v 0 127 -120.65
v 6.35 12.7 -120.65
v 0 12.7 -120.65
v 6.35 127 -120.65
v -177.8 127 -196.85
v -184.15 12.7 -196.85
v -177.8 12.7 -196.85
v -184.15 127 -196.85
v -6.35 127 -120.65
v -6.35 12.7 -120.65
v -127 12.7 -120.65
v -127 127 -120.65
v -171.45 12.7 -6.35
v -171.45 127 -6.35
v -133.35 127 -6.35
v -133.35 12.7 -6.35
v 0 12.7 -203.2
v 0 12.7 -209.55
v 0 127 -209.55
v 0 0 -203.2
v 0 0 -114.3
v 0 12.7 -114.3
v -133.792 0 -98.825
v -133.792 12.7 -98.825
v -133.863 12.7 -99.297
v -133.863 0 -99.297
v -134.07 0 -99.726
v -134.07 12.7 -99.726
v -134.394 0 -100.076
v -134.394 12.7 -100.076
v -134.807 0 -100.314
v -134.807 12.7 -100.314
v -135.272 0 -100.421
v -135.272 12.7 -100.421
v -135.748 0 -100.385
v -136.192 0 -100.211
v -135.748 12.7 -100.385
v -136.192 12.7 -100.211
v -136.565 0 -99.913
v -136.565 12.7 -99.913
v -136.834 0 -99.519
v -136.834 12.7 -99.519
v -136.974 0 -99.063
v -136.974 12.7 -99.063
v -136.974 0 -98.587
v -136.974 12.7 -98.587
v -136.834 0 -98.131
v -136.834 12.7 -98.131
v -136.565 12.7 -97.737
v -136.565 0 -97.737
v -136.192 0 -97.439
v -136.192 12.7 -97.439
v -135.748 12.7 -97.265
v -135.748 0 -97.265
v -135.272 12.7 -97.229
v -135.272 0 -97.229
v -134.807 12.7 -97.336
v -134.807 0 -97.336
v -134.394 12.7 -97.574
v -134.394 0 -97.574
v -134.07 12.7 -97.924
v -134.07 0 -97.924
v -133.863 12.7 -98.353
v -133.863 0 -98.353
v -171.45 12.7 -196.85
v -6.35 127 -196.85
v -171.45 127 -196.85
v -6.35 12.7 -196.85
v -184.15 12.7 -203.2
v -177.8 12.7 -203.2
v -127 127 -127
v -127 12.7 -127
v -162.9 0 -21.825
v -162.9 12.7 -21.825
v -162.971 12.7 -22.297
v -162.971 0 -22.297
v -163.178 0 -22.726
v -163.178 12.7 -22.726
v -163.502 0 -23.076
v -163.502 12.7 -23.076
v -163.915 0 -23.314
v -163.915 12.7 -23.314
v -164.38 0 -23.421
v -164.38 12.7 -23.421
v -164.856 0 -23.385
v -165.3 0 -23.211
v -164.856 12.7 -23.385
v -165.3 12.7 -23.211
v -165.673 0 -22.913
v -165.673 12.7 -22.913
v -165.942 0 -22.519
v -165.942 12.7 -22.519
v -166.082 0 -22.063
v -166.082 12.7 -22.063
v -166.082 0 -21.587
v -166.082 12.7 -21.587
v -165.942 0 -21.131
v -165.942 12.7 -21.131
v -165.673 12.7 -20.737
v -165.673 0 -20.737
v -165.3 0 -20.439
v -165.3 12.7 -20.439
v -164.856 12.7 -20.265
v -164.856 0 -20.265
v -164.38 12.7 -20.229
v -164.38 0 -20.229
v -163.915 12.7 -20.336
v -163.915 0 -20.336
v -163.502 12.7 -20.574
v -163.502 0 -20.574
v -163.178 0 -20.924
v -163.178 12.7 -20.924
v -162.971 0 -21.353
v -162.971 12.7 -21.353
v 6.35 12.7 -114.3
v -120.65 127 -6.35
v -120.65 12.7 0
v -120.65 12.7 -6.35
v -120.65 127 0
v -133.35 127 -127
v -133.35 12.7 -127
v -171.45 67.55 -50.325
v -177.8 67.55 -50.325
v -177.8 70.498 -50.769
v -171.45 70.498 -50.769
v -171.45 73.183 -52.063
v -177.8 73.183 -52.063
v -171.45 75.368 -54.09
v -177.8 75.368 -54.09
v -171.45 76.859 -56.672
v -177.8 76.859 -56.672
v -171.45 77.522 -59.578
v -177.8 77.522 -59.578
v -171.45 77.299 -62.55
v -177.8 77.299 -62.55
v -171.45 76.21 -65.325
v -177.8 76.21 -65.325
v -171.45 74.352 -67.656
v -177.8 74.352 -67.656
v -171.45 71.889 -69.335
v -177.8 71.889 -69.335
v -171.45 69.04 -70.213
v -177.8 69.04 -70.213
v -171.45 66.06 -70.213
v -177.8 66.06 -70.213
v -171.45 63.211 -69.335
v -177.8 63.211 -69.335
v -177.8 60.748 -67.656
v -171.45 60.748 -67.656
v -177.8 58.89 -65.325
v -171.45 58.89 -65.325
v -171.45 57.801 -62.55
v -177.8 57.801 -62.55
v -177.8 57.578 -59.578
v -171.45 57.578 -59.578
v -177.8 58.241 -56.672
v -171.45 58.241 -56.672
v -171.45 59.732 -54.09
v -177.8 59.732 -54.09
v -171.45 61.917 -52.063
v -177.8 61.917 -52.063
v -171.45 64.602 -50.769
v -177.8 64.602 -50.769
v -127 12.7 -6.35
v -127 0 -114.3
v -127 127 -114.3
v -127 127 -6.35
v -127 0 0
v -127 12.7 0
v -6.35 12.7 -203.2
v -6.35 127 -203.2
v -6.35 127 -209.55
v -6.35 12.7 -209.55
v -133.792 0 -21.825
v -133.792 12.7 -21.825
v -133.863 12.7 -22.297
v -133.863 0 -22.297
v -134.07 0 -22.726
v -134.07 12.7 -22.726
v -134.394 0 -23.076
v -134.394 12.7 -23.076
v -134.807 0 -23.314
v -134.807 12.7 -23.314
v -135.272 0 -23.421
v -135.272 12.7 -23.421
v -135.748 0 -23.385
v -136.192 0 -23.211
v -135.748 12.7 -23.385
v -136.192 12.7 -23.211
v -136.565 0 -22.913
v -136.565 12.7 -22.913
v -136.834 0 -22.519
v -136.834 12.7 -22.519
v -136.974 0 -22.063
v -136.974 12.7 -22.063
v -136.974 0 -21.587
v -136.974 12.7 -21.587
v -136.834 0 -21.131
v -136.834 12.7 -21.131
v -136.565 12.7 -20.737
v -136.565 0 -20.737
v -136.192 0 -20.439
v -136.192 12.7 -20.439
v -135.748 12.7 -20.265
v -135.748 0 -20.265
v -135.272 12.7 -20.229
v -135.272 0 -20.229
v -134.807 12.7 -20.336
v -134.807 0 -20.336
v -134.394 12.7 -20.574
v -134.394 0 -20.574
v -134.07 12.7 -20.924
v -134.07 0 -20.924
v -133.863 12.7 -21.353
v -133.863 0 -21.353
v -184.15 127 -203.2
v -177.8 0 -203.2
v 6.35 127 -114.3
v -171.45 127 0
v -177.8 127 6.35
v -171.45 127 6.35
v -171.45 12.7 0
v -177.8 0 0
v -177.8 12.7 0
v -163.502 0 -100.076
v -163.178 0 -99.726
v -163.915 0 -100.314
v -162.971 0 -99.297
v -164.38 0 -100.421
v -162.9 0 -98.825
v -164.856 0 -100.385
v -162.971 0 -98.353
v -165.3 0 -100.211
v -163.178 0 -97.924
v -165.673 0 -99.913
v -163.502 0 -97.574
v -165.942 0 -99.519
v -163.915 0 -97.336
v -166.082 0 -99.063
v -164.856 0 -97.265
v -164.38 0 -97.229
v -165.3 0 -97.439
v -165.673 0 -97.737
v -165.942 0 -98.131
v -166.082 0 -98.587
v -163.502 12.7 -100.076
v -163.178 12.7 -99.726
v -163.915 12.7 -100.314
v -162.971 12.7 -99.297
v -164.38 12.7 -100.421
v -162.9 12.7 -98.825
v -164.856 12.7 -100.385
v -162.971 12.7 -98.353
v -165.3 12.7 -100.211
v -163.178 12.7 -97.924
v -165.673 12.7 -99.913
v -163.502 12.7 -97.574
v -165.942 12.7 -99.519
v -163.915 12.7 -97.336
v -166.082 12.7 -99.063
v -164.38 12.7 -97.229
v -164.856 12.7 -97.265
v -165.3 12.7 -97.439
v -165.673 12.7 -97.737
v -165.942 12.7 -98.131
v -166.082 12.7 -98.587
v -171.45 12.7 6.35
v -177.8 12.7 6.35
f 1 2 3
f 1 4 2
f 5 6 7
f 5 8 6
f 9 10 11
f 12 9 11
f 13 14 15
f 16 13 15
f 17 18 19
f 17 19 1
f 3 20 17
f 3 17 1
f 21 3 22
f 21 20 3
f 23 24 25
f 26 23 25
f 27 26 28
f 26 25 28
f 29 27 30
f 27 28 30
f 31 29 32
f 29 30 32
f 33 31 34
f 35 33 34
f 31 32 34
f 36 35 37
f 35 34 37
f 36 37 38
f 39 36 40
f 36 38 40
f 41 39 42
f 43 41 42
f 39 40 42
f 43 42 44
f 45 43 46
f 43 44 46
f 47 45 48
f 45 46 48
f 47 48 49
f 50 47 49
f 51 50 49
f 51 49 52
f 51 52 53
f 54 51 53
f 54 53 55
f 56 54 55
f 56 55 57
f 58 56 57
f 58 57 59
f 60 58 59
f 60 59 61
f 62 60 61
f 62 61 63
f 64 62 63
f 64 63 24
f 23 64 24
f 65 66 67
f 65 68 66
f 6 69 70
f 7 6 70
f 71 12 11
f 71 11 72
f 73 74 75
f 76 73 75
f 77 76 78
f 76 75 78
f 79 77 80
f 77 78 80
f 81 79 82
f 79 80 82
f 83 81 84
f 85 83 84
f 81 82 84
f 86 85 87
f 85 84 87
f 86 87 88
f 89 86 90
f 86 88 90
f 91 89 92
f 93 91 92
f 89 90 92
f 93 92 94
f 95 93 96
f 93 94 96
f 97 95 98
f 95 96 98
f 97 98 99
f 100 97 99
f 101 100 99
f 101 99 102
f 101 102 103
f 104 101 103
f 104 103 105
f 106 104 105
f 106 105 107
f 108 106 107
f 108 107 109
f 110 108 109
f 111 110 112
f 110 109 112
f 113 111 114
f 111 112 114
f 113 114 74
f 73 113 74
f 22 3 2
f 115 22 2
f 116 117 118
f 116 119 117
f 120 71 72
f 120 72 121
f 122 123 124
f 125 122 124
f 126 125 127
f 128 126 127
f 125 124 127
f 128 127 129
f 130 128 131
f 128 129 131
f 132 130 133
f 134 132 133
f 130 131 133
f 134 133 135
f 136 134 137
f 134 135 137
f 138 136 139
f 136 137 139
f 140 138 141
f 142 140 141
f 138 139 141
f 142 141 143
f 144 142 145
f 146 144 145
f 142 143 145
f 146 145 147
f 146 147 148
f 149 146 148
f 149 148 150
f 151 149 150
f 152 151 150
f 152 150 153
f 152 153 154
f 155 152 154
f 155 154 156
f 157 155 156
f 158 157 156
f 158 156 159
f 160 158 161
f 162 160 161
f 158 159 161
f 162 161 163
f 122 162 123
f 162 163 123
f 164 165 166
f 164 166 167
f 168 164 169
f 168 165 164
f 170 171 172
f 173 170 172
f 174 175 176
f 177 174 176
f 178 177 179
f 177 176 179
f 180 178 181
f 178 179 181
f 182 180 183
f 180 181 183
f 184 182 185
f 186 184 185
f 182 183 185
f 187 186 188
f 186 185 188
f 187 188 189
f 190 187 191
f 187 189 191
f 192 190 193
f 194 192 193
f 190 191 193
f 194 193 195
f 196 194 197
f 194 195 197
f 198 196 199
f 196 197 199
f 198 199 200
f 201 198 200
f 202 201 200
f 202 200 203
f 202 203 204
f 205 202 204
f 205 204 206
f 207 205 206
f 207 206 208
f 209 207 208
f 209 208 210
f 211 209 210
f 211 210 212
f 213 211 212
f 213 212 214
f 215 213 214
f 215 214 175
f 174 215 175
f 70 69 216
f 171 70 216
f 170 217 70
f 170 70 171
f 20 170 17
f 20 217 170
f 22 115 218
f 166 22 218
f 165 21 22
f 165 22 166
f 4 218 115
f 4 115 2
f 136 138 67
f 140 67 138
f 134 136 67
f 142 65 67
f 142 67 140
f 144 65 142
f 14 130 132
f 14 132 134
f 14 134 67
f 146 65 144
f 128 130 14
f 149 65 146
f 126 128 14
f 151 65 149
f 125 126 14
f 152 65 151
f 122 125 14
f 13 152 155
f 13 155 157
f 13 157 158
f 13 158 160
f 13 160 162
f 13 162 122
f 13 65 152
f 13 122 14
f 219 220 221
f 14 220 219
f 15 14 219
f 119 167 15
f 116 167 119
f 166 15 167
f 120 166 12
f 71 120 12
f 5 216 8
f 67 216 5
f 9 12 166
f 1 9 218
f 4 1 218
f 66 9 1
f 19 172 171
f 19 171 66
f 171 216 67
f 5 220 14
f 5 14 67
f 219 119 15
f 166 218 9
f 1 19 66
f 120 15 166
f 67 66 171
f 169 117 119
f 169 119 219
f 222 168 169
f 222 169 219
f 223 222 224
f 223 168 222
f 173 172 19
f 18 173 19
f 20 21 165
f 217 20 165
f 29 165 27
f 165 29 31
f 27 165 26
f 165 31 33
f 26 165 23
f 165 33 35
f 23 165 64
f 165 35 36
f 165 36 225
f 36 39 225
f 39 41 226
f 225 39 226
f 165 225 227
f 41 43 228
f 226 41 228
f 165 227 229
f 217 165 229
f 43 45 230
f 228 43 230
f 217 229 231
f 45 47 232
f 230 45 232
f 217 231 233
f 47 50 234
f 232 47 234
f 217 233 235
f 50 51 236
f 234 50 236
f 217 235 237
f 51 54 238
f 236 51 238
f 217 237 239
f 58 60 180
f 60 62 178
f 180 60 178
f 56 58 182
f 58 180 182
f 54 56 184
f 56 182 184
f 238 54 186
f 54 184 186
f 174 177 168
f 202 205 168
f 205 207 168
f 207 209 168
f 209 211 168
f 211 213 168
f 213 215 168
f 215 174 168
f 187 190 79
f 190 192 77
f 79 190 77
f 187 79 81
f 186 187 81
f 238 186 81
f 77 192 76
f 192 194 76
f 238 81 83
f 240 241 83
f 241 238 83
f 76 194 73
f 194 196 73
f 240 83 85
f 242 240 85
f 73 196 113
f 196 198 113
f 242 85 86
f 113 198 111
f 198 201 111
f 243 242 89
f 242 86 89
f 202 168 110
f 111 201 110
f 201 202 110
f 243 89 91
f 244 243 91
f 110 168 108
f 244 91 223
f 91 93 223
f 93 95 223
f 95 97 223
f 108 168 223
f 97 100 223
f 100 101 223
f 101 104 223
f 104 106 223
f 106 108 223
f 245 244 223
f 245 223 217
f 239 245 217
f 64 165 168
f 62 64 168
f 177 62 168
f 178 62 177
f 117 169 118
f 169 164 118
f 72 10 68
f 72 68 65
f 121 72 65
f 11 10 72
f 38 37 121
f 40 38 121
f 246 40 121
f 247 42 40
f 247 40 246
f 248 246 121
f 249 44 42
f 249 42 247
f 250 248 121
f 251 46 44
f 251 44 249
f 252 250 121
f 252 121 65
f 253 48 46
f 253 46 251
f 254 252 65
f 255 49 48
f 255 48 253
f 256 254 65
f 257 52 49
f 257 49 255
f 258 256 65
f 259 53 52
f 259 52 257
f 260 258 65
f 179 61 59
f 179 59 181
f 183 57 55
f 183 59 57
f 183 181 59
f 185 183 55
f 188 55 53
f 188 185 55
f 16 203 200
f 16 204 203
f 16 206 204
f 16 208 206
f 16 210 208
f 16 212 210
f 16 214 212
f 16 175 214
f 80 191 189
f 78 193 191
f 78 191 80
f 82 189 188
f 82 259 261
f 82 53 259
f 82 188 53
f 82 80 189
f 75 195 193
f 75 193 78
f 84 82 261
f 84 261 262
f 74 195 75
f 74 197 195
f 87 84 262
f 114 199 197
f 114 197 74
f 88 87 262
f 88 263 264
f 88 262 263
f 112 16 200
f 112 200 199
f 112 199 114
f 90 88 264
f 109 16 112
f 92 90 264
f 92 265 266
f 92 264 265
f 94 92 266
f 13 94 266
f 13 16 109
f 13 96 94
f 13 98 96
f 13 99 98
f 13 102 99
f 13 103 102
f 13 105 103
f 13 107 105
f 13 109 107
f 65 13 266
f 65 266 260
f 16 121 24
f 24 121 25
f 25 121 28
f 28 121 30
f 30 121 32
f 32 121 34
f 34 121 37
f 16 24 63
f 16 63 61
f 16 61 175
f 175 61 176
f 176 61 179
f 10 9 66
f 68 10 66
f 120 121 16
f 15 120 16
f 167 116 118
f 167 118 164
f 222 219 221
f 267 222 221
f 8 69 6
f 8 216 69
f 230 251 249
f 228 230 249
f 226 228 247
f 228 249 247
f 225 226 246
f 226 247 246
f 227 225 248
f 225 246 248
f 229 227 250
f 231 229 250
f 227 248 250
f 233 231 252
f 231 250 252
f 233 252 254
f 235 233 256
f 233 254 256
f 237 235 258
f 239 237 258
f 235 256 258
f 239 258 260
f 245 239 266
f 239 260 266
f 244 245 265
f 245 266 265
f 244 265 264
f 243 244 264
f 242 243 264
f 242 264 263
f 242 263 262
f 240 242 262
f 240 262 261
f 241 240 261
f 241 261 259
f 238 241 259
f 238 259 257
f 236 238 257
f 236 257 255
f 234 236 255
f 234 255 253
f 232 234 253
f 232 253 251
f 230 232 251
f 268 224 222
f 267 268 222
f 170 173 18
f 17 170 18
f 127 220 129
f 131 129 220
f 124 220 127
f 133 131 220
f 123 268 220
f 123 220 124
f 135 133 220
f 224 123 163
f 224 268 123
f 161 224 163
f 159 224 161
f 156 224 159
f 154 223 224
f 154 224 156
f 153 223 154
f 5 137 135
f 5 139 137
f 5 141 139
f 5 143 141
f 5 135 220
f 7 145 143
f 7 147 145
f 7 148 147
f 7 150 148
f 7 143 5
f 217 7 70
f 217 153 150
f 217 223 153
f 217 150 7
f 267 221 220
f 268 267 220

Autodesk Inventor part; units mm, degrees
ref_plane "YZ Plane" through (0, 0, 0) normal (1, 0, 0) x (0, 1, 0)
ref_plane "XZ Plane" through (0, 0, 0) normal (0, 1, 0) x (-1, 0, 0)
ref_plane "XY Plane" through (0, 0, 0) normal (0, 0, 1) x (1, 0, 0)
sketch "Sketch2" plane through (0, 0, 0) normal (0, 1, 0) x (-1, 0, 0)
  line L0 (127, 0) -> (177.8, 0)
  line L1 (177.8, 0) -> (177.8, -203.2)
  line L2 (177.8, -203.2) -> (0, -203.2)
  line L3 (0, -203.2) -> (0, -114.3)
  line L4 (0, -114.3) -> (127, -114.3)
  line L5 (127, -114.3) -> (127, 0)
  point P0 (0, 0)
  dimension "d0" = 203.2
  dimension "d1" = 177.8
  dimension "d65" = 50.8
  dimension "d66" = 88.9
extrude "Extrusion1" add sketch "Sketch2" along normal blind 12.7
sketch "Sketch3" plane through (0, 12.7, 0) normal (0, 1, 0) x (1, 0, 0)
  line L0 (-127, 0) -> (-177.8, 0)
  line L1 (-177.8, 0) -> (-177.8, 203.2)
  line L2 (-177.8, 203.2) -> (0, 203.2)
  line L3 (0, 203.2) -> (0, 114.3)
  line L4 (-171.45, 196.85) -> (-171.45, 6.35)
  line L5 (-171.45, 6.35) -> (-133.35, 6.35)
  line L6 (-6.35, 120.65) -> (-6.35, 196.85)
  line L7 (-6.35, 196.85) -> (-171.45, 196.85)
  line L8 (0, 114.3) -> (-127, 114.3)
  line L9 (-127, 114.3) -> (-127, 0)
  line L10 (-6.35, 120.65) -> (-133.35, 120.65)
  line L11 (-133.35, 120.65) -> (-133.35, 6.35)
  line L12 (-127, 0) -> (-127, 114.3) projected
  line L13 (0, 114.3) -> (0, 203.2) projected
  point P0 (0, 0)
  point P1 (-127, 6.35)
  point P2 (0, 120.65)
  point P3 (-114.3, 0)
  point P4 (-6.35, 114.3)
  dimension "d4" = 6.35
  dimension "d61" = 120.65
  dimension "d62" = 107.95
  dimension "d63" = 6.35
  dimension "d64" = 6.35
  dimension "d76" = 0
  dimension "d77" = 6.35
  dimension "d78" = 0
extrude "Extrusion2" add sketch "Sketch3" along normal blind 114.3
sketch "Sketch5" plane through (0, 12.7, 0) normal (0, 1, 0) x (1, 0, 0)
  line L0 (-114.3, 114.3) -> (-114.3, 6.35)
  line L1 (-6.35, 120.65) -> (-6.3512, 120.1928)
  line L2 (-171.45, 114.3) -> (-114.3, 114.3)
  line L3 (-171.45, 6.35) -> (-171.45, 196.85) projected
  line L4 (-133.35, 6.35) -> (-171.45, 6.35) projected
  line L5 (-171.45, 120.65) -> (-57.15, 120.65)
  line L6 (-107.95, 114.3) -> (-107.95, 6.35)
  line L7 (-171.45, 120.65) -> (-6.35, 120.65)
  line L8 (-107.95, 114.3) -> (-6.35, 114.3)
  line L9 (-6.35, 196.85) -> (-6.35, 120.65) projected
  line L10 (-171.45, 120.65) -> (-171.45, 114.3)
  line L11 (-6.35, 120.65) -> (-6.35, 114.3)
  line L12 (-6.35, 120.65) -> (-6.35, 114.3)
  line L13 (-133.35, 6.35) -> (-107.95, 6.35)
  line L14 (-171.45, 6.35) -> (-133.35, 6.35) projected
  point P0 (-6.35, 6.35)
  dimension "d37" = 107.95
  dimension "d38" = 6.35
  dimension "d58" = 101.6
  dimension "d60" = 6.35
extrude "Extrusion5" [suppressed]
sketch "Sketch6" plane through (0, 0, 0) normal (0, -1, 0) x (1, 0, 0)
  line L0 (0, -203.2) -> (-177.8, 0) construction
  circle A0 centre (-88.9, -101.6) radius 101.6 construction
  line L1 (-177.8, -203.2) -> (0, 0) construction
  point P0 (-155.8041, -178.0618)
  point P1 (-155.8041, -25.1382)
  point P2 (-21.9959, -25.1382)
  point P3 (-21.9959, -178.0618)
  dimension "d25" = 203.2
hole "Hole1" [suppressed]
sketch "Sketch7" plane through (-6.35, 12.7, -196.85) normal (-1, 0, 0) x (0, 0, 1)
  line L0 (76.2, 0) -> (0, 0) projected
  line L1 (76.2, 114.3) -> (76.2, 0) projected
  line L2 (0, 0) -> (76.2, 0)
  line L3 (76.2, 0) -> (76.2, 63.5)
  line L4 (76.2, 63.5) -> (0, 63.5)
  line L5 (0, 63.5) -> (0, 0)
  point P0 (196.85, -12.7)
  dimension "d39" = 63.5
extrude "Extrusion6" [suppressed]
sketch "Sketch10" plane through (0, 12.7, 0) normal (0, 1, 0) x (1, 0, 0)
  line L0 (-164.5, 98.825) -> (-135.392, 98.825) construction
  line L1 (-135.392, 98.825) -> (-135.392, 21.825) construction
  line L2 (-135.392, 21.825) -> (-164.5, 21.825) construction
  line L3 (-164.5, 21.825) -> (-164.5, 98.825) construction
  line L4 (-171.45, 6.35) -> (-171.45, 196.85) projected
  line L5 (-133.35, 114.3) -> (-171.45, 114.3) projected
  line L6 (-171.45, 6.35) -> (-133.35, 6.35) projected
  circle A0 centre (-135.392, 98.825) radius 1.6
  circle A1 centre (-164.5, 98.825) radius 1.6
  circle A2 centre (-135.392, 21.825) radius 1.6
  circle A3 centre (-164.5, 21.825) radius 1.6
  point P0 (0, 0)
  point P1 (-127, 114.3)
  point P2 (-127, 6.35)
  dimension "d40" = 6.95
  dimension "d41" = 29.108
  dimension "d42" = 77
  dimension "d43" = 15.475
  dimension "d44" = 15.475
  dimension "d45" = 3.2
  dimension "d46" = 3.2
  dimension "d47" = 3.2
  dimension "d48" = 3.2
extrude "Extrusion7" cut sketch "Sketch10" against normal through all
sketch "Sketch11" plane through (-177.8, 0, -203.2) normal (-1, 0, 0) x (0, 0, 1)
  line L0 (203.2, 0) -> (203.2, 127) projected
  line L1 (203.2, 20.5386) -> (0, 20.5386) construction
  line L2 (0, 0) -> (0, 127) projected
  line L3 (196.85, 127) -> (6.35, 127) projected
  circle A0 centre (142.875, 67.55) radius 10
  line L4 (0, 0) -> (203.2, 0) projected
  point P0 (88.9, 127)
  dimension "d51" = 20
  dimension "d52" = 67.55
  dimension "d53" = 53.975
  dimension "d54" = 53.975
extrude "Extrusion8" cut sketch "Sketch11" against normal up to surface (6.35 mm away)
sketch "Sketch14" plane through (0, 127, 0) normal (0, 1, 0) x (1, 0, 0)
  line L0 (-177.8, 0) -> (-127, 0) projected
  line L1 (-127, 0) -> (-120.65, 0)
  line L2 (-120.65, 0) -> (-120.65, 6.35)
  line L3 (-120.65, 6.35) -> (-127, 6.35)
  line L4 (-127, 6.35) -> (-127, 0)
  line L5 (-177.8, 0) -> (-171.45, 0)
  line L6 (-171.45, 0) -> (-171.45, -6.35)
  line L7 (-171.45, -6.35) -> (-177.8, -6.35)
  line L8 (-177.8, -6.35) -> (-177.8, 0)
  point P0 (0, 0)
  dimension "d79" = 6.35
  dimension "d80" = 6.35
  dimension "d81" = 6.35
  dimension "d82" = 6.35
extrude "Extrusion11" add sketch "Sketch14" against normal up to surface (114.3 mm away)
sketch "Sketch15" plane through (0, 127, 0) normal (0, 1, 0) x (1, 0, 0)
  circle A0 centre (-135.392, 21.825) radius 1.6 projected
  circle A1 centre (-135.392, 98.825) radius 1.6 projected
  circle A2 centre (-164.5, 98.825) radius 1.6 projected
  circle A3 centre (-164.5, 21.825) radius 1.6 projected
  line L0 (-6.35, 196.85) -> (-171.45, 196.85) projected
  line L1 (-171.45, 196.85) -> (-171.45, 6.35) projected
  line L2 (-171.45, 6.35) -> (-133.35, 6.35) projected
  line L3 (-133.35, 6.35) -> (-133.35, 120.65) projected
  line L4 (-133.35, 120.65) -> (-6.35, 120.65) projected
  line L5 (-6.35, 120.65) -> (-6.35, 196.85) projected
  line L6 (-133.35, 120.65) -> (-127, 120.65)
  line L7 (-127, 120.65) -> (-127, 127)
  line L8 (-127, 127) -> (-133.35, 127)
  line L9 (-133.35, 127) -> (-133.35, 120.65)
  line L10 (-171.45, 196.85) -> (-6.35, 196.85) projected
  line L11 (-6.35, 196.85) -> (-6.35, 120.65) projected
  line L12 (-6.35, 120.65) -> (-133.35, 120.65) projected
  line L13 (-133.35, 120.65) -> (-133.35, 6.35) projected
  line L14 (-133.35, 6.35) -> (-171.45, 6.35) projected
  line L15 (-171.45, 6.35) -> (-171.45, 196.85) projected
  line L16 (-177.8, 203.2) -> (-177.8, -6.35) projected
  line L17 (-177.8, -6.35) -> (-171.45, -6.35) projected
  line L18 (-171.45, -6.35) -> (-171.45, 0) projected
  line L19 (-171.45, 0) -> (-120.65, 0) projected
  line L20 (-120.65, 0) -> (-120.65, 6.35) projected
  line L21 (-120.65, 6.35) -> (-127, 6.35) projected
  line L22 (-127, 6.35) -> (-127, 114.3) projected
  line L23 (-127, 114.3) -> (0, 114.3) projected
  line L24 (0, 114.3) -> (0, 203.2) projected
  line L25 (0, 203.2) -> (-177.8, 203.2) projected
  line L26 (0, 114.3) -> (6.35, 114.3)
  line L27 (6.35, 114.3) -> (6.35, 120.65)
  line L28 (6.35, 120.65) -> (0, 120.65)
  line L29 (0, 120.65) -> (0, 114.3)
  line L30 (0, 114.3) -> (0, 203.2) projected
  line L31 (0, 203.2) -> (-6.35, 203.2)
  line L32 (-6.35, 203.2) -> (-6.35, 209.55)
  line L33 (-6.35, 209.55) -> (0, 209.55)
  line L34 (0, 209.55) -> (0, 203.2)
  line L35 (0, 203.2) -> (-177.8, 203.2) projected
  line L36 (-177.8, 203.2) -> (-184.15, 203.2)
  line L37 (-184.15, 203.2) -> (-184.15, 196.85)
  line L38 (-184.15, 196.85) -> (-177.8, 196.85)
  line L39 (-177.8, 196.85) -> (-177.8, 203.2)
  point P0 (0, 0)
  dimension "d85" = 6.35
  dimension "d86" = 6.35
  dimension "d87" = 6.35
  dimension "d88" = 6.35
  dimension "d89" = 6.35
  dimension "d90" = 6.35
  dimension "d91" = 6.35
extrude "Extrusion12" add sketch "Sketch15" against normal up to surface (114.3 mm away) contours L4 L9 L8 L7 | L16 L38 L37 L36 | L32 L33 L34 L25 | L28 L27 L26 L24
equation "\"d43\" = d44"
equation "\"d53\" = d54"
properties part number "RSX Structure" material "Aluminum 6061"
